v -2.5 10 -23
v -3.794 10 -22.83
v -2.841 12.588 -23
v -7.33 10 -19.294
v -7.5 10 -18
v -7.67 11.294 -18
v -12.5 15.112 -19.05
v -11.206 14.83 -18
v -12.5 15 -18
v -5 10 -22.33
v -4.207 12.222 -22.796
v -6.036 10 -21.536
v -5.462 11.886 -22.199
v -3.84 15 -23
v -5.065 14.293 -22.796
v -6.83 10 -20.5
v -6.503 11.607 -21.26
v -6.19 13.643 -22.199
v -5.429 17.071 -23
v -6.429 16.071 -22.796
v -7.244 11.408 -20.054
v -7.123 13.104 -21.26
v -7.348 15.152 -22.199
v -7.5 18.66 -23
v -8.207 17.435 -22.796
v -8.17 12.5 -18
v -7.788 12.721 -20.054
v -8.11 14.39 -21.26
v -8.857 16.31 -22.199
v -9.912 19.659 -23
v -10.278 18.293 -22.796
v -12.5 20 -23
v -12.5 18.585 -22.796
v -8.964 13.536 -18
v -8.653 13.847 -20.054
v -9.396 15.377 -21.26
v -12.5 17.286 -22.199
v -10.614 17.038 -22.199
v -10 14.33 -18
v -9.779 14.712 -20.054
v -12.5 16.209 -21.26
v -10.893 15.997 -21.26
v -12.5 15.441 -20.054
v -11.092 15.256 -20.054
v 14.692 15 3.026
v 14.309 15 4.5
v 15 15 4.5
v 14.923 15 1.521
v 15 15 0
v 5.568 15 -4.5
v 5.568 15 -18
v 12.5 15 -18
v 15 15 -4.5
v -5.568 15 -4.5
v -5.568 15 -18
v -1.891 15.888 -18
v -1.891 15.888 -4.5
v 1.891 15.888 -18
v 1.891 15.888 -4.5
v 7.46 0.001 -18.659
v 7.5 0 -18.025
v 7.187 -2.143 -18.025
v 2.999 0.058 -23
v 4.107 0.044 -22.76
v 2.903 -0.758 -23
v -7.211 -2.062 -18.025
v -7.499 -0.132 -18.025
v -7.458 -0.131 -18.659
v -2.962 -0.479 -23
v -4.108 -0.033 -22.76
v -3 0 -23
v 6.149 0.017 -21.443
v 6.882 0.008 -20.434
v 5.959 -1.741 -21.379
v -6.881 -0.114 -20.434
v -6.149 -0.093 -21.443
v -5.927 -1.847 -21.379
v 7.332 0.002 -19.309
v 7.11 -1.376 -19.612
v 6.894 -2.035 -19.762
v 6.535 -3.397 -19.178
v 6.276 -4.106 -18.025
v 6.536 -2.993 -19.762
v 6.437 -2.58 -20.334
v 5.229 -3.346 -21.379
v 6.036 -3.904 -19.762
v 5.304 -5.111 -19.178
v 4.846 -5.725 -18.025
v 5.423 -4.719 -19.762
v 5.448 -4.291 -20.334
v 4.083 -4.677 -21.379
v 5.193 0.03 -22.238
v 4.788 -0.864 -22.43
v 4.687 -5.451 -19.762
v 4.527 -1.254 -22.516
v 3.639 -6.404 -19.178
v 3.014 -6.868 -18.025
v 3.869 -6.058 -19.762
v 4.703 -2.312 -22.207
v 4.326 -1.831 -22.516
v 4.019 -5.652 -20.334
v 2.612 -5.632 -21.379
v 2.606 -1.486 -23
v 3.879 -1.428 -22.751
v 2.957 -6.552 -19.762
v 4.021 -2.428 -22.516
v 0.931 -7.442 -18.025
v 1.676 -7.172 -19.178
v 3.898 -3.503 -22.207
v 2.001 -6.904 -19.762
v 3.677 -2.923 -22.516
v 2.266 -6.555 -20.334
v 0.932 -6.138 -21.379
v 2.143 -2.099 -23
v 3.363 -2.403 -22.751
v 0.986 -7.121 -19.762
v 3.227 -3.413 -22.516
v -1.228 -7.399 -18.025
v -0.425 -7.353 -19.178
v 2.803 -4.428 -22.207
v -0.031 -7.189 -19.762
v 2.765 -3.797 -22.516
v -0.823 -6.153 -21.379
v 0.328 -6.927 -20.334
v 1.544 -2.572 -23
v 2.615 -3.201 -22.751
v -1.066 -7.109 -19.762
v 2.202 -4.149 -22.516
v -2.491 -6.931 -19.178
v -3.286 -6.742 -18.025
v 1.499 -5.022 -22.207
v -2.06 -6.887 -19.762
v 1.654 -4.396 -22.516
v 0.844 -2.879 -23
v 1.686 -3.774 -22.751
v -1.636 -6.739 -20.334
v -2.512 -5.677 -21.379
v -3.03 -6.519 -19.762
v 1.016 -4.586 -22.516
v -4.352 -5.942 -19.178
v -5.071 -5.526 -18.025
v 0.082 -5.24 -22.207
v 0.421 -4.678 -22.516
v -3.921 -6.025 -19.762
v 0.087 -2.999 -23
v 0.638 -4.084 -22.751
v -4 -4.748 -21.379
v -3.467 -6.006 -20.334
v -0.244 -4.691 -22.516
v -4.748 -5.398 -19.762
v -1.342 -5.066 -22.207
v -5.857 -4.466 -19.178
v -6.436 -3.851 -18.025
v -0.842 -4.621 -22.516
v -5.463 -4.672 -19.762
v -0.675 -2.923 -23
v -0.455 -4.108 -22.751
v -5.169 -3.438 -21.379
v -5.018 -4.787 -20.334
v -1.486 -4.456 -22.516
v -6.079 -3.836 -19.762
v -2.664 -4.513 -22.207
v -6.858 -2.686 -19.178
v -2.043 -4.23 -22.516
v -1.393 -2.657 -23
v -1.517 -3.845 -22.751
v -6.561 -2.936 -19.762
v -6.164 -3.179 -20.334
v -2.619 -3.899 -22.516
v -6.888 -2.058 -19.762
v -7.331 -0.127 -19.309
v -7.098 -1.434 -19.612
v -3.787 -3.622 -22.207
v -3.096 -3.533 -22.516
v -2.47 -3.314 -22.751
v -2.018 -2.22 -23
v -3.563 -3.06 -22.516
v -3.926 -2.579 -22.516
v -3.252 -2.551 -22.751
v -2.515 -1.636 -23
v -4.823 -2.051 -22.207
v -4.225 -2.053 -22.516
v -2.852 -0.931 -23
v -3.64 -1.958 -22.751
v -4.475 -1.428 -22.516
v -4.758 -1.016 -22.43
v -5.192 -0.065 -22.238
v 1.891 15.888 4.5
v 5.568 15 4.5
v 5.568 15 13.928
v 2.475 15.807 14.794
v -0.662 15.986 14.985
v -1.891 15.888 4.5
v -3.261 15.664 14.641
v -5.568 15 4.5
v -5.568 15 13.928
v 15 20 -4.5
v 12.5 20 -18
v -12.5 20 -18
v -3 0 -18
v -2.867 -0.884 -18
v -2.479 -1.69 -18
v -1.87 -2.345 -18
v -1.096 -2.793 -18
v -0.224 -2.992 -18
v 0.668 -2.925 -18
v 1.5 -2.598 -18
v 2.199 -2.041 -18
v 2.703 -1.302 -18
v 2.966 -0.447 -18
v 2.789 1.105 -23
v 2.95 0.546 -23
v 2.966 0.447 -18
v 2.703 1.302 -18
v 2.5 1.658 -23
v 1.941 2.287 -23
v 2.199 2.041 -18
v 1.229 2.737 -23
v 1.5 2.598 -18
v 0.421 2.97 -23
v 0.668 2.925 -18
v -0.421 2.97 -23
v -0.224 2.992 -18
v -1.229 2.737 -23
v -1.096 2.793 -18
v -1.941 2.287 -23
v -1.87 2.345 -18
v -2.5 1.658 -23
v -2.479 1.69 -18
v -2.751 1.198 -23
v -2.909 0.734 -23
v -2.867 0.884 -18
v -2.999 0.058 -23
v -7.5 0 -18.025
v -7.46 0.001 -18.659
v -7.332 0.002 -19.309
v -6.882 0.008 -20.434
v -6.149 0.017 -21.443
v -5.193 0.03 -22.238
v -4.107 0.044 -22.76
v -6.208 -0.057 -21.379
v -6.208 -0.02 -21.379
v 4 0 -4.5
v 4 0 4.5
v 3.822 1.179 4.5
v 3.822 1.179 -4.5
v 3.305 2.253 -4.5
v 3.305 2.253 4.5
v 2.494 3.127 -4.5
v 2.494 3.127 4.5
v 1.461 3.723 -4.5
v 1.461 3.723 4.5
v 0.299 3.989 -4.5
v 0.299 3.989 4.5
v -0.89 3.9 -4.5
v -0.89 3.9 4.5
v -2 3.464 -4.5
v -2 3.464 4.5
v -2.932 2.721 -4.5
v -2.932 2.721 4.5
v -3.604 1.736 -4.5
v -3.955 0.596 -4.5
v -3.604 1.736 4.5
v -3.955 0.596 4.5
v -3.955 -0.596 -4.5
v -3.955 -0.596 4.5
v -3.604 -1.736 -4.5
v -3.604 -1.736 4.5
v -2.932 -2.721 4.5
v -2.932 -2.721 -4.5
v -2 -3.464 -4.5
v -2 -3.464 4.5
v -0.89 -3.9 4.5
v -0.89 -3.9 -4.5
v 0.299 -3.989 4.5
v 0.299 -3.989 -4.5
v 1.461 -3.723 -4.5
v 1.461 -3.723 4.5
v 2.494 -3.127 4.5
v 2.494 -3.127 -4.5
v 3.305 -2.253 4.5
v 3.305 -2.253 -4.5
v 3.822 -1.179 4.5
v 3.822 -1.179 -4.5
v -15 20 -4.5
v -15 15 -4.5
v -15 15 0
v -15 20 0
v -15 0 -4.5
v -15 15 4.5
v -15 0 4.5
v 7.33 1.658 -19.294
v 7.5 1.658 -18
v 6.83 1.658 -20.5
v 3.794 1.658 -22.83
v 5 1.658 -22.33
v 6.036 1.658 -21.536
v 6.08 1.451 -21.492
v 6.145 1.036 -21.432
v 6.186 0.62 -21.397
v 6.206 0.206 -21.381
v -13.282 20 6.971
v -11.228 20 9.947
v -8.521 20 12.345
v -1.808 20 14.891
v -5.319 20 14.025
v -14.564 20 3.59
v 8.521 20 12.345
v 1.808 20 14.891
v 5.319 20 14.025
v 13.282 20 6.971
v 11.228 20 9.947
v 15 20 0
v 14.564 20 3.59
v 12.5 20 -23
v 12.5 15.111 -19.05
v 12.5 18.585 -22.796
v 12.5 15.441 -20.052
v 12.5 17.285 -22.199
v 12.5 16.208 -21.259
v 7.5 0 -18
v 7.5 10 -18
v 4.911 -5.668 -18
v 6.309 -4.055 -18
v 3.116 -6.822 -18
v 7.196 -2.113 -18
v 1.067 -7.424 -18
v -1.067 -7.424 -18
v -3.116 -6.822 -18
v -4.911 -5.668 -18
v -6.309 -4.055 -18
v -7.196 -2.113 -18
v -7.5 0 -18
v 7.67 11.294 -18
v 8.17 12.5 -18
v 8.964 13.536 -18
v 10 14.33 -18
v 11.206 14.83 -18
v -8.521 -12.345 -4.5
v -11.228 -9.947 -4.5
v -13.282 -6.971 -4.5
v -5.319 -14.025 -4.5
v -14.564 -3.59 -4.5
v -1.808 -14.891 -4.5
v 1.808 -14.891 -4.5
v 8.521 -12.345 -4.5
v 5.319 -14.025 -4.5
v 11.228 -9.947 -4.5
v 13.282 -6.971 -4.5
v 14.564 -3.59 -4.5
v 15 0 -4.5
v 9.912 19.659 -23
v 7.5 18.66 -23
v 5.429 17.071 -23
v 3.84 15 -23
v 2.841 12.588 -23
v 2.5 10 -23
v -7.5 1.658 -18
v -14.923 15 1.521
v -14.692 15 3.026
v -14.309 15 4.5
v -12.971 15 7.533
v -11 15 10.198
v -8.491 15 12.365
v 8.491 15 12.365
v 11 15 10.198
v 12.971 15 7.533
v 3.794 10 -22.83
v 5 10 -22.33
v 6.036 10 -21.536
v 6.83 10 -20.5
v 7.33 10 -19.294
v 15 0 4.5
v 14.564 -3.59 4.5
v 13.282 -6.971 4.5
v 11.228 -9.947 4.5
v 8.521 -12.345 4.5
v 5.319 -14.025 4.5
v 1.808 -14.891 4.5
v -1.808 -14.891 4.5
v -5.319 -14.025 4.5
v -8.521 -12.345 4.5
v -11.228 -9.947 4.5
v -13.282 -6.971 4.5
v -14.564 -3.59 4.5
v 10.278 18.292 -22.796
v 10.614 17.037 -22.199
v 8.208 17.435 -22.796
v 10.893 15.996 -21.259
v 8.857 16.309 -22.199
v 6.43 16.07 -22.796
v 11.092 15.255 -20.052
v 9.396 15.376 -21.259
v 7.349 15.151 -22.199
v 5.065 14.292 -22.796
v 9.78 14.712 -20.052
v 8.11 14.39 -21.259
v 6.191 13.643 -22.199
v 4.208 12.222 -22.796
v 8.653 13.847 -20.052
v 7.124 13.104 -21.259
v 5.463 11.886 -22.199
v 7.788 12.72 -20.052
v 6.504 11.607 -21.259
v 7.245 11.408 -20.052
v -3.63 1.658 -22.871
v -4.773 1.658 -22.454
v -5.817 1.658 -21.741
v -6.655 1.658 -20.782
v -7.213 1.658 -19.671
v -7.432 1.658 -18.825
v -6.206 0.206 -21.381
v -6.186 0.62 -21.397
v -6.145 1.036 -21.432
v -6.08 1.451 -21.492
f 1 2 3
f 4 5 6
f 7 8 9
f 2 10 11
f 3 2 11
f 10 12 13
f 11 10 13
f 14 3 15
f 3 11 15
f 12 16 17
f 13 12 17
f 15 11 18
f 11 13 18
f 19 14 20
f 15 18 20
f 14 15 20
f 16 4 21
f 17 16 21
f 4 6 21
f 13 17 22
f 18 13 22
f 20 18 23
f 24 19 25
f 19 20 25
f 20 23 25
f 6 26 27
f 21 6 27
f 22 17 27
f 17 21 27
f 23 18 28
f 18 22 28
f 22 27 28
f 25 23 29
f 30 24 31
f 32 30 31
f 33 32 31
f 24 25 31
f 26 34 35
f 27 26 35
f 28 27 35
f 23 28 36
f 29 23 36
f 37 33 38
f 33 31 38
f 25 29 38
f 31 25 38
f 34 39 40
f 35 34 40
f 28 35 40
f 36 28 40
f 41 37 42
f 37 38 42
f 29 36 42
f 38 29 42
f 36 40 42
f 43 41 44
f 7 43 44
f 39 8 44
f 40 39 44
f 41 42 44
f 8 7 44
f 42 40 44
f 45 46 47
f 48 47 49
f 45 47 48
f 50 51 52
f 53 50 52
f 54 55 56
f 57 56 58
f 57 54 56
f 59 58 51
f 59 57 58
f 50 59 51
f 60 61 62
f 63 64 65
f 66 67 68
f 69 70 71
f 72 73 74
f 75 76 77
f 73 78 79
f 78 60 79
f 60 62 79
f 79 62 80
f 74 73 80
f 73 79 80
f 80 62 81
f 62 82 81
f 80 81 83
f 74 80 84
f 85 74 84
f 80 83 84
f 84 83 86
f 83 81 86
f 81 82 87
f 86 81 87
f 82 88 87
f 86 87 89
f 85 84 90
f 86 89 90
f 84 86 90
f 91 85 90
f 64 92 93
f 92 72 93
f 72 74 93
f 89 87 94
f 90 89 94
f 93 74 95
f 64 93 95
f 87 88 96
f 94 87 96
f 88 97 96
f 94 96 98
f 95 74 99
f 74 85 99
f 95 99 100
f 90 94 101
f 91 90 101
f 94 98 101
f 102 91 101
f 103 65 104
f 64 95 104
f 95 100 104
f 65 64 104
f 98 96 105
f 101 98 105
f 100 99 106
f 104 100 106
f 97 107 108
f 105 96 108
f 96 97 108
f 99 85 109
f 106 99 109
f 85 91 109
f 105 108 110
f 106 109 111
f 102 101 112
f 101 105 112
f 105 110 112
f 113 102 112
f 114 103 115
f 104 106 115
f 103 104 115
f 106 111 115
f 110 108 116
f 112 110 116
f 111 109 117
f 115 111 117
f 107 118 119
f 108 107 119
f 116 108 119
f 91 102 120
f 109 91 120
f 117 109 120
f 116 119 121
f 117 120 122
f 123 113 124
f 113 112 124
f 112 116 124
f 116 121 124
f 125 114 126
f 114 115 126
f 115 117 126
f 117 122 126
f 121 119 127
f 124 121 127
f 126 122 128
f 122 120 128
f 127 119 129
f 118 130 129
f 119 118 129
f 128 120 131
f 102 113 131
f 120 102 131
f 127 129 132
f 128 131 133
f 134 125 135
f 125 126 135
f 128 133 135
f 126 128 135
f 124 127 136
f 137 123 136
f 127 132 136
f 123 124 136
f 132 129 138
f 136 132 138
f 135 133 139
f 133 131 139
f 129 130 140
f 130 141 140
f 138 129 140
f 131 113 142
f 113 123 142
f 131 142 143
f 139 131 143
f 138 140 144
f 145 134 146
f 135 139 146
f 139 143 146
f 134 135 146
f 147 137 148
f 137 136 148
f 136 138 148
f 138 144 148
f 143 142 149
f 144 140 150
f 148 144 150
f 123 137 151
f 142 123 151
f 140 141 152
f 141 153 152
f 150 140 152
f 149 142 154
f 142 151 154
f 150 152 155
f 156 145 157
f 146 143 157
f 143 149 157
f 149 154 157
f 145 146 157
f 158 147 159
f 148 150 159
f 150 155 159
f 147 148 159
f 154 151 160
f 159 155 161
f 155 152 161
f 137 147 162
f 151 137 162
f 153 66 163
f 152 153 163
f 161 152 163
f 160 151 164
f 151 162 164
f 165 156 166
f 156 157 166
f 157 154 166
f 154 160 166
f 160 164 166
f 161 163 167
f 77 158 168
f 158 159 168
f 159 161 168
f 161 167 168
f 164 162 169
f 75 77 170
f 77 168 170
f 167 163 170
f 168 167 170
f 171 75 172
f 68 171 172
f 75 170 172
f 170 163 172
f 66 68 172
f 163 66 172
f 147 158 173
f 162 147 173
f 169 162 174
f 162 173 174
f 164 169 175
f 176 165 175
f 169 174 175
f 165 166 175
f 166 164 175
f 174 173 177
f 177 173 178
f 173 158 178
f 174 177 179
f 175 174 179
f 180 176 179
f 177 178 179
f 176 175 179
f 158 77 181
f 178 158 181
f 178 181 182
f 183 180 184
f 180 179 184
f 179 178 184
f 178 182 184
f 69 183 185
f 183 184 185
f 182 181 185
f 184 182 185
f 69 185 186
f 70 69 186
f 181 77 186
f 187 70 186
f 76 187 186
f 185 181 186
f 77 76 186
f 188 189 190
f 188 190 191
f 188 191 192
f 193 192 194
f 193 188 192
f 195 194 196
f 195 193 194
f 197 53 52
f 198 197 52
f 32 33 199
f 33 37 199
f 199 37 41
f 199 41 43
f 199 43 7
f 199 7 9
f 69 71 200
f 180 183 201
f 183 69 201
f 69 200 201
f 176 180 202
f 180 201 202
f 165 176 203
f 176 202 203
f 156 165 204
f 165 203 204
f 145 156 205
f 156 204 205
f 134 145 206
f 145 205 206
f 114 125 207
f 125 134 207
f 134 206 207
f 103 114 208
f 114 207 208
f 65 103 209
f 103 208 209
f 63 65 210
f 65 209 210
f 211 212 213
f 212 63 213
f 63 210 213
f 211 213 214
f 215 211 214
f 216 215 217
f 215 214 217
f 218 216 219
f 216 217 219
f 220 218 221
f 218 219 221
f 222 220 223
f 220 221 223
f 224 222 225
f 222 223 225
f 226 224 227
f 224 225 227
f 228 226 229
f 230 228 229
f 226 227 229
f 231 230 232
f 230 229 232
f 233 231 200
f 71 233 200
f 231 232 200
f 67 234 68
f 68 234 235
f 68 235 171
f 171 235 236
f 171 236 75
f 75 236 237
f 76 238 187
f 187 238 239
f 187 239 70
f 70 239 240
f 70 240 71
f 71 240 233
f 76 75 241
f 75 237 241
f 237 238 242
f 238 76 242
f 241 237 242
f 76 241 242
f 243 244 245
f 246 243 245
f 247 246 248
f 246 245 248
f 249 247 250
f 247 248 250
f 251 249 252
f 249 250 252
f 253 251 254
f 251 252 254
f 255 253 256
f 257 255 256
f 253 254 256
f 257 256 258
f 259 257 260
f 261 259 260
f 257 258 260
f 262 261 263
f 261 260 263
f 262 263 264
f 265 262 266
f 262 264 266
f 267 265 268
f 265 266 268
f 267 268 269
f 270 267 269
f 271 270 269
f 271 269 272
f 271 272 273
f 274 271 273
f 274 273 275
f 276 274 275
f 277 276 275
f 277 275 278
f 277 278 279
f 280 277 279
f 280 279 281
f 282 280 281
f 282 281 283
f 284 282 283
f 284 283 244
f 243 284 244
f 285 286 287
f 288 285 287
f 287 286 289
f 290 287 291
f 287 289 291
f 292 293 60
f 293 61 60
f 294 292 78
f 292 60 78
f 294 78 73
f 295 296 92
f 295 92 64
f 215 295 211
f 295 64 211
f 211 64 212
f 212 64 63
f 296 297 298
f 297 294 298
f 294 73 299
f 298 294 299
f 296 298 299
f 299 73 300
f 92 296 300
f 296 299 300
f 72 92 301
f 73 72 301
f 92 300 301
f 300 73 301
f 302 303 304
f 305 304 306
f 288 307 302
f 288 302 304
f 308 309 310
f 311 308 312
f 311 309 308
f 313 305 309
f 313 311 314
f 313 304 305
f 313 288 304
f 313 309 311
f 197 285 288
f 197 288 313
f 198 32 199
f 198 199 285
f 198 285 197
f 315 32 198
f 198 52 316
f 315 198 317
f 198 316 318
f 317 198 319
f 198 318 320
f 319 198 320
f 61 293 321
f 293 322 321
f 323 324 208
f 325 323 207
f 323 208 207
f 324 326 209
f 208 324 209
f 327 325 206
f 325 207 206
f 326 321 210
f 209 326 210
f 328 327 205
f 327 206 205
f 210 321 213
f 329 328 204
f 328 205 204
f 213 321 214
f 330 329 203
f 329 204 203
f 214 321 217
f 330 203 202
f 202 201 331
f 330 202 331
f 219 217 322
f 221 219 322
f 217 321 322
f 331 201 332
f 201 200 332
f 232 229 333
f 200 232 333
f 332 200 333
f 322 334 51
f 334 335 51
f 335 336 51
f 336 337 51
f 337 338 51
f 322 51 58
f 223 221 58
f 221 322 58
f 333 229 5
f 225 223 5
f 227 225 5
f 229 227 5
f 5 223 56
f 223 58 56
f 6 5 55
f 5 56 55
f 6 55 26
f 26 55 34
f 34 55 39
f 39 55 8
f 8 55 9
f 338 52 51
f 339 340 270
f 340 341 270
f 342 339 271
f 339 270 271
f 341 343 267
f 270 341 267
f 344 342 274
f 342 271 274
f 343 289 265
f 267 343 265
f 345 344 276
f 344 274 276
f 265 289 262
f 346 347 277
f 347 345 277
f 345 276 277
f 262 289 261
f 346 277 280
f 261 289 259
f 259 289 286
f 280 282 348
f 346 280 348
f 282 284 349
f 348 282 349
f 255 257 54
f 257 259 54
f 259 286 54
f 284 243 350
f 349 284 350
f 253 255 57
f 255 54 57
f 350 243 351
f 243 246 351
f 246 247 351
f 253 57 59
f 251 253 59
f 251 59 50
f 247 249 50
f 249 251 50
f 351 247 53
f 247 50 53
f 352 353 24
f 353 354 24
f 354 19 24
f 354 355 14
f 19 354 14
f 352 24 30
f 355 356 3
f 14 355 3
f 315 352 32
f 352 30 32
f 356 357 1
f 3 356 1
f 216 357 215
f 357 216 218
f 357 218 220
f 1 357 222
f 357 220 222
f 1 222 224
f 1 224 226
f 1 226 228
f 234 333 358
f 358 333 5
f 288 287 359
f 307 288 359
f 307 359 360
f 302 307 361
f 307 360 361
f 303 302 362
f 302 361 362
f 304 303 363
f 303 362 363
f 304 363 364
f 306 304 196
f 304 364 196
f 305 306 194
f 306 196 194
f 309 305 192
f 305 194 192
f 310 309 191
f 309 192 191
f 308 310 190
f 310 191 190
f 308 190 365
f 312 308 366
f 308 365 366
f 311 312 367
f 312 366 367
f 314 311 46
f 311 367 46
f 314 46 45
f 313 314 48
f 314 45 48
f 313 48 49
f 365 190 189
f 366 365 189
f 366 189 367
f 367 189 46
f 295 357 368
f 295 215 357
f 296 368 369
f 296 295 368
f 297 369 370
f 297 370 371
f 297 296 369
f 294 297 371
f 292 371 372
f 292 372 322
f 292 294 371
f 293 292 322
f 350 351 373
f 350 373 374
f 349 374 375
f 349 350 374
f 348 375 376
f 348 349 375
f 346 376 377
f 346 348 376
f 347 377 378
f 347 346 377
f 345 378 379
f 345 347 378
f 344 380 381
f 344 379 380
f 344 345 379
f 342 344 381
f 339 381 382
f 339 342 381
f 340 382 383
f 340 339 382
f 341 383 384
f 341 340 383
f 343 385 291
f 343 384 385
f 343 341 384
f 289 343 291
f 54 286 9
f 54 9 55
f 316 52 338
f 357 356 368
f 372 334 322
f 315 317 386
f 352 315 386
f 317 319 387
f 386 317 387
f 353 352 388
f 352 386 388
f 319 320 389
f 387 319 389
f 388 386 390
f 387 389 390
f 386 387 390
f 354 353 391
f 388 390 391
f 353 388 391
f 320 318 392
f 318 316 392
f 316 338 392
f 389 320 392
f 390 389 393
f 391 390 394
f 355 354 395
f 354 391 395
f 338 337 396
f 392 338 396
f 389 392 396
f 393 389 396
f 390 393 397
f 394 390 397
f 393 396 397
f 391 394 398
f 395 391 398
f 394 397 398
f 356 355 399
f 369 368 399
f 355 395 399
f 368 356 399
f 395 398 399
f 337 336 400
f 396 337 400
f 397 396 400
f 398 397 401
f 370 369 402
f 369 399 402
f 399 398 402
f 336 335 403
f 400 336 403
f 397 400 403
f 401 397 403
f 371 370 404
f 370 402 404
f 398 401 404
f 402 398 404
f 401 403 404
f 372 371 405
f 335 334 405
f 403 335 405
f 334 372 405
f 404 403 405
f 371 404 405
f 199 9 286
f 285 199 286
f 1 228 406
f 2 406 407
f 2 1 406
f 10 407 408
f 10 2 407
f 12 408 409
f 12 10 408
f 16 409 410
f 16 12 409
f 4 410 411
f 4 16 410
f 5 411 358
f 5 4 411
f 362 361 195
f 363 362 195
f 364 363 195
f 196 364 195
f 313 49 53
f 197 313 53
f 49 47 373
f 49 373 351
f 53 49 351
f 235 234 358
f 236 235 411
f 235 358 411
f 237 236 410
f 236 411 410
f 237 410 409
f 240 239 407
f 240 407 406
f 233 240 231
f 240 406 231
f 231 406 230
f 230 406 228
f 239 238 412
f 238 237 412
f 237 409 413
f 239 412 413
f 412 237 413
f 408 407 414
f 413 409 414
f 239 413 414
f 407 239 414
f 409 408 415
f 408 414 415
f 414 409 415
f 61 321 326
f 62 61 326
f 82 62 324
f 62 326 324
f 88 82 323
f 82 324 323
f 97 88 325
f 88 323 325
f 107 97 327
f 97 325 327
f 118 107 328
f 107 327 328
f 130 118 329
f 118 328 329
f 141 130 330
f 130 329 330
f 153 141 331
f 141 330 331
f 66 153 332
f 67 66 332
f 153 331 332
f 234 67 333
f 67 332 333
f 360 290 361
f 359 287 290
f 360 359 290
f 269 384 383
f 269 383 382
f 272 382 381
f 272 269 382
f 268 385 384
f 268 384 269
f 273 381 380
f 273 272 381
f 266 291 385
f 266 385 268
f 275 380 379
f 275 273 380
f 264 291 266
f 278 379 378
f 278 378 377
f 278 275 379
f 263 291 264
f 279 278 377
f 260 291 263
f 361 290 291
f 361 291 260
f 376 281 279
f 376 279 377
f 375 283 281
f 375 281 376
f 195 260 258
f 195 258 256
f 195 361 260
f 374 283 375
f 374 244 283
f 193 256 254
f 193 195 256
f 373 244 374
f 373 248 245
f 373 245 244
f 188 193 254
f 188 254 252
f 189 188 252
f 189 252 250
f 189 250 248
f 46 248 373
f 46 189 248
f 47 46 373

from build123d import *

# Parameters (mm, degrees)
SKETCH1_R            = 15
BOSS_EXTRUDE1_DEPTH  = 30
SKETCH8_W            = 30
SKETCH8_H            = 15
REVOLVE1_ANGLE       = 180
SKETCH9_W            = 30
SKETCH9_H            = 30
BOSS_EXTRUDE3_DEPTH  = 15
SKETCH10_R           = 5
CUT_EXTRUDE1_DEPTH   = 30
SKETCH13_R           = 16
CUT_EXTRUDE2_DEPTH   = 10
SKETCH14_W           = 10
SKETCH14_H           = 15
CUT_EXTRUDE3_DEPTH   = 67
CUT_EXTRUDE4_START   = -7
SKETCH15_R           = 11
SKETCH15_R_2         = 5
CUT_EXTRUDE4_DEPTH   = 7
SKETCH16_R           = 11
SKETCH16_R_2         = 5
CUT_EXTRUDE5_DEPTH   = 7
SKETCH17_R           = 15
SKETCH17_R_2         = 8
SKETCH17_R_3         = 3.5
BOSS_EXTRUDE4_DEPTH  = 2
BOSS_EXTRUDE5_DEPTH  = 5
BOSS_EXTRUDE6_DEPTH  = 16
SKETCH21_W           = 53
SKETCH21_H           = 30
CUT_EXTRUDE7_DEPTH   = 20
SKETCH23_W           = 15
SKETCH23_H           = 9
SKETCH24_W           = 30
SKETCH24_H           = 9
BOSS_EXTRUDE7_DEPTH  = 15
SKETCH25_R           = 4
CUT_EXTRUDE8_DEPTH   = 15
BOSS_EXTRUDE8_START  = 3
SKETCH26_W           = 10
SKETCH26_H           = 15
BOSS_EXTRUDE8_DEPTH  = 5
SKETCH30_W           = 30
SKETCH30_H           = 15
BOSS_EXTRUDE9_DEPTH  = 3
SKETCH27_R           = 16
CUT_EXTRUDE9_DEPTH   = 16
SKETCH28_R           = 16
CUT_EXTRUDE10_DEPTH  = 10.5
SKETCH29_R           = 16
CUT_EXTRUDE12_DEPTH  = 10
SKETCH31_W           = 53
SKETCH31_H           = 41.496728026
CUT_EXTRUDE13_DEPTH  = 37
BOSS_EXTRUDE10_DEPTH = 5
SKETCH35_W           = 30
SKETCH35_H           = 9
BOSS_EXTRUDE11_DEPTH = 5
SKETCH36_R           = 16
CUT_EXTRUDE14_DEPTH  = 13.5
SKETCH37_R           = 16
CUT_EXTRUDE15_DEPTH  = 18.5
FILLET1_R            = 5


with BuildPart() as part:
    # Sketch1 → Boss-Extrude1 (new body)
    with BuildSketch(Plane(origin=(0, 0, 0), x_dir=(1, 0, 0), z_dir=(0, 1, 0))):
        with Locations(Location((0, 0, 0), (0, 0, 270))):
            Circle(SKETCH1_R)
    extrude(amount=BOSS_EXTRUDE1_DEPTH)

    # Sketch8 → Revolve1 (revolve)
    with BuildSketch(Plane(origin=(0, 30, 0), x_dir=(1, 0, 0), z_dir=(0, 1, 0))):
        with Locations((0, -7.5)):
            Rectangle(SKETCH8_W, SKETCH8_H)
    revolve(axis=Axis((15, 30, 0), (-1, 0, 0)), revolution_arc=REVOLVE1_ANGLE)

    # Sketch9 → Boss-Extrude3 (add)
    with BuildSketch(Plane.XZ.offset(-30)):
        Rectangle(SKETCH9_W, SKETCH9_H)
    extrude(amount=BOSS_EXTRUDE3_DEPTH)

    # Sketch10 → Cut-Extrude1 (cut)
    with BuildSketch(Plane(origin=(15, 0, 0), x_dir=(0, 0, -1), z_dir=(1, 0, 0))):
        with Locations((0, 30)):
            Circle(SKETCH10_R)
    extrude(amount=-CUT_EXTRUDE1_DEPTH, mode=Mode.SUBTRACT)

    # Sketch13 → Cut-Extrude2 (cut)
    with BuildSketch(Plane(origin=(5, 0, 0), x_dir=(0, 0, -1), z_dir=(1, 0, 0))):
        with Locations((0, 30)):
            Circle(SKETCH13_R)
    extrude(amount=-CUT_EXTRUDE2_DEPTH, mode=Mode.SUBTRACT)

    # Sketch14 → Cut-Extrude3 (cut)
    with BuildSketch(Plane.XY.offset(15)):
        with Locations((0, 22.5)):
            Rectangle(SKETCH14_W, SKETCH14_H)
    extrude(amount=-CUT_EXTRUDE3_DEPTH, mode=Mode.SUBTRACT)

    # Sketch15 → Cut-Extrude4 (cut)
    with BuildSketch(Plane.ZY.offset(15).offset(CUT_EXTRUDE4_START)):
        with Locations((0, 30)):
            Circle(SKETCH15_R)
        with Locations(Location((0, 30, 0), (0, 0, 180))):
            Circle(SKETCH15_R_2, mode=Mode.SUBTRACT)
    extrude(amount=CUT_EXTRUDE4_DEPTH, mode=Mode.SUBTRACT)

    # Sketch16 → Cut-Extrude5 (cut)
    with BuildSketch(Plane(origin=(15, 0, 0), x_dir=(0, 0, -1), z_dir=(1, 0, 0))):
        with Locations(Location((0, 30, 0), (0, 0, 180))):
            Circle(SKETCH16_R)
        with Locations((0, 30)):
            Circle(SKETCH16_R_2, mode=Mode.SUBTRACT)
    extrude(amount=-CUT_EXTRUDE5_DEPTH, mode=Mode.SUBTRACT)



with BuildPart() as body_2:
    # Sketch17 → Boss-Extrude4 (new body)
    # profile 1 of 4: a face of its own
    with BuildSketch(Plane.ZY.offset(31)):
        with Locations((0, 30)):
            Circle(SKETCH17_R)
        with Locations((0, 30)):
            Circle(SKETCH17_R_2, mode=Mode.SUBTRACT)
    # profile 2 of 4: a face of its own
    with BuildSketch(Plane.ZY.offset(31)):
        with Locations((0, 30)):
            Circle(SKETCH17_R_2)
        with Locations((0, 30)):
            Circle(SKETCH17_R_3, mode=Mode.SUBTRACT)
    # profile 3 of 4: a face of its own
    with BuildSketch(Plane.ZY.offset(31)):
        with BuildLine():
            ThreePointArc((0, 15), (-10.606601718, 19.393398282), (-15, 30))
            Line((-15, 30), (-15, 15))
            Line((-15, 15), (0, 15))
        make_face()
    # profile 4 of 4: a face of its own
    with BuildSketch(Plane.ZY.offset(31)):
        with BuildLine():
            Line((15, 15), (15, 30))
            ThreePointArc((15, 30), (10.606601718, 19.393398282), (0, 15))
            Line((0, 15), (15, 15))
        make_face()
    extrude(amount=BOSS_EXTRUDE4_DEPTH)

    # Sketch18 → Boss-Extrude5 (add)
    with BuildSketch(Plane.ZY.offset(33)):
        with BuildLine():
            ThreePointArc((-8.5, 30), (0, 38.5), (8.5, 30))
            Line((8.5, 30), (8.5, 15))
            Line((8.5, 15), (15, 15))
            Line((15, 15), (15, 30))
            ThreePointArc((15, 30), (0, 45), (-15, 30))
            Line((-15, 30), (-15, 15))
            Line((-15, 15), (-8.5, 15))
            Line((-8.5, 15), (-8.5, 30))
        make_face()
    extrude(amount=BOSS_EXTRUDE5_DEPTH)


with BuildPart() as part_1:
    add(part.part)

    add(body_2.part)  # Boss-Extrude6 merges body 2
    # Sketch20 → Boss-Extrude6 (add)
    with BuildSketch(Plane.ZY.offset(15)):
        with BuildLine():
            ThreePointArc((11.5, 30), (0, 18.5), (-11.5, 30))
            Line((-11.5, 30), (-15, 30))
            Line((-15, 30), (-15, 15))
            Line((-15, 15), (0, 15))
            Line((0, 15), (15, 15))
            Line((15, 15), (15, 30))
            Line((15, 30), (11.5, 30))
        make_face()
    extrude(amount=BOSS_EXTRUDE6_DEPTH)

    # Sketch21 → Cut-Extrude7 (cut)
    with BuildSketch(Plane.XZ.offset(-15)):
        with Locations((-11.5, 0)):
            Rectangle(SKETCH21_W, SKETCH21_H)
    extrude(amount=CUT_EXTRUDE7_DEPTH, mode=Mode.SUBTRACT)


with BuildPart() as cut_extrude7_piece_1:
    # of the separate pieces the step leaves, piece 1, a body of its own (cut_extrude7_pieces)
    add(part_1.part.solids().sort_by_distance((-31, 30, 15))[0])



with BuildPart() as cut_extrude7_piece_2:
    # of the separate pieces the step leaves, piece 2, a body of its own (cut_extrude7_pieces)
    add(part_1.part.solids().sort_by_distance((5, 15, -15))[0])


with BuildPart() as body_3:
    # Sketch23 → Revolve2 (revolve)
    with BuildSketch(Plane(origin=(0, 0, 0), x_dir=(-1, 0, 0), z_dir=(0, -1, 0)), mode=Mode.PRIVATE) as revolve2_sk:
        with Locations((-7.5, 0)):
            Rectangle(SKETCH23_W, SKETCH23_H)
    revolve(revolve2_sk.sketch.rotate(Axis((0, 0, 4.5), (0, 0, -1)), 90), axis=Axis((0, 0, 4.5), (0, 0, -1)))


with BuildPart() as cut_extrude7_piece_1_1:
    add(cut_extrude7_piece_1.part)

    add(cut_extrude7_piece_2.part)  # Boss-Extrude7 merges Cut-Extrude7 piece 2

    add(body_3.part)  # Boss-Extrude7 merges body 3
    # Sketch24 → Boss-Extrude7 (add)
    with BuildSketch(Plane.XZ.offset(-15)):
        Rectangle(SKETCH24_W, SKETCH24_H)
    extrude(amount=BOSS_EXTRUDE7_DEPTH)

    # Sketch25 → Cut-Extrude8 (cut)
    with BuildSketch(Plane.XY.offset(4.5)):
        Circle(SKETCH25_R)
    extrude(amount=-CUT_EXTRUDE8_DEPTH, mode=Mode.SUBTRACT)



with BuildPart() as body_2_2:
    # Sketch26 → Boss-Extrude8 (new body)
    with BuildSketch(Plane(origin=(0, 0, -15), x_dir=(-1, 0, 0), z_dir=(0, 0, -1)).offset(BOSS_EXTRUDE8_START)):
        with Locations((-10, 22.5)):
            Rectangle(SKETCH26_W, SKETCH26_H)
        with BuildLine():
            Line((15, 30), (-5, 30))
            Line((-5, 30), (-5, 15))
            Line((-5, 15), (-12.5, 15))
            ThreePointArc((-12.5, 15), (-8.964466094, 13.535533906), (-7.5, 10))
            Line((-7.5, 10), (-7.5, 0))
            ThreePointArc((-7.5, 0), (0, 7.5), (7.5, 0))
            Line((7.5, 0), (7.5, 10))
            ThreePointArc((7.5, 10), (8.964466094, 13.535533906), (12.5, 15))
            Line((12.5, 15), (15, 15))
            Line((15, 15), (15, 30))
        make_face()
        with BuildLine():
            ThreePointArc((7.5, 0), (0, 7.5), (-7.5, 0))
            Line((-7.5, 0), (-3, 0))
            ThreePointArc((-3, 0), (0, 3), (3, 0))
            Line((3, 0), (7.5, 0))
        make_face()
        with BuildLine():
            Line((-3, 0), (-7.5, 0))
            ThreePointArc((-7.5, 0), (0, -7.5), (7.5, 0))
            Line((7.5, 0), (3, 0))
            ThreePointArc((3, 0), (0, -3), (-3, 0))
        make_face()
    extrude(amount=BOSS_EXTRUDE8_DEPTH)


with BuildPart() as cut_extrude7_piece_1_2:
    add(cut_extrude7_piece_1_1.part)

    add(body_2_2.part)  # Boss-Extrude9 merges body 2 2
    # Sketch30 → Boss-Extrude9 (add)
    with BuildSketch(Plane.XY.offset(-18)):
        with Locations((0, 22.5)):
            Rectangle(SKETCH30_W, SKETCH30_H)
    extrude(amount=BOSS_EXTRUDE9_DEPTH)

    # Sketch27 → Cut-Extrude9 (cut)
    with BuildSketch(Plane.XY.offset(4.5)):
        Circle(SKETCH27_R)
    extrude(amount=CUT_EXTRUDE9_DEPTH, mode=Mode.SUBTRACT)

    # Sketch28 → Cut-Extrude10 (cut)
    with BuildSketch(Plane(origin=(0, 0, -4.5), x_dir=(-1, 0, 0), z_dir=(0, 0, -1))):
        Circle(SKETCH28_R)
    extrude(amount=CUT_EXTRUDE10_DEPTH, mode=Mode.SUBTRACT)

    # Sketch29 → Cut-Extrude12 (cut)
    with BuildSketch(Plane.ZY.offset(-5)):
        with Locations((0, 30)):
            Circle(SKETCH29_R)
    extrude(amount=CUT_EXTRUDE12_DEPTH, mode=Mode.SUBTRACT)

    # Sketch31 → Cut-Extrude13 (cut)
    with BuildSketch(Plane.XZ.offset(-15)):
        with Locations((-11.5, -5.748364013)):
            Rectangle(SKETCH31_W, SKETCH31_H)
    extrude(amount=-CUT_EXTRUDE13_DEPTH, mode=Mode.SUBTRACT)


with BuildPart() as cut_extrude13_piece_1:
    # of the separate pieces the step leaves, piece 1, a body of its own (cut_extrude13_pieces)
    add(cut_extrude7_piece_1_2.part.solids().sort_by_distance((5, 14.645847467, 4.5))[0])



with BuildPart() as cut_extrude13_piece_2:
    # of the separate pieces the step leaves, piece 2, a body of its own (cut_extrude13_pieces)
    add(cut_extrude7_piece_1_2.part.solids().sort_by_distance((-7.5, 10, -18))[0])


with BuildPart() as cut_extrude13_piece_1_1:
    add(cut_extrude13_piece_1.part)

    add(cut_extrude13_piece_2.part)  # Boss-Extrude10 merges Cut-Extrude13 piece 2
    # Sketch33 → Boss-Extrude10 (add)
    with BuildSketch(Plane(origin=(0, 15, 0), x_dir=(1, 0, 0), z_dir=(0, 1, 0))):
        with BuildLine():
            Line((12.5, 23), (-12.5, 23))
            Line((-12.5, 23), (-12.5, 18))
            Line((-12.5, 18), (-15, 4.5))
            Line((-15, 4.5), (-15, 0))
            ThreePointArc((-15, 0), (0, -15), (15, 0))
            Line((15, 0), (15, 4.5))
            Line((15, 4.5), (12.5, 18))
            Line((12.5, 18), (12.5, 23))
        make_face()
    extrude(amount=BOSS_EXTRUDE10_DEPTH)

    # Sketch35 → Boss-Extrude11 (add)
    with BuildSketch(Plane.XZ.offset(-15)):
        Rectangle(SKETCH35_W, SKETCH35_H)
    extrude(amount=BOSS_EXTRUDE11_DEPTH)

    # Sketch36 → Cut-Extrude14 (cut)
    with BuildSketch(Plane(origin=(0, 0, -4.5), x_dir=(-1, 0, 0), z_dir=(0, 0, -1))):
        Circle(SKETCH36_R)
    extrude(amount=CUT_EXTRUDE14_DEPTH, mode=Mode.SUBTRACT)

    # Sketch37 → Cut-Extrude15 (cut)
    with BuildSketch(Plane.XY.offset(4.5)):
        Circle(SKETCH37_R)
    extrude(amount=CUT_EXTRUDE15_DEPTH, mode=Mode.SUBTRACT)

    # Fillet1
    fillet1_edges = [cut_extrude13_piece_1_1.edges().sort_by_distance(p)[0] for p in [
        (-8.964466094, 13.535533906, -23),
        (8.964466094, 13.535533906, -23),
        (7.5, 5, -23),
        (-7.5, 5, -23),
    ]]
    fillet(fillet1_edges, radius=FILLET1_R - 0.0001)  # a hair under: the kernel refuses the full size


solid = cut_extrude13_piece_1_1.part
